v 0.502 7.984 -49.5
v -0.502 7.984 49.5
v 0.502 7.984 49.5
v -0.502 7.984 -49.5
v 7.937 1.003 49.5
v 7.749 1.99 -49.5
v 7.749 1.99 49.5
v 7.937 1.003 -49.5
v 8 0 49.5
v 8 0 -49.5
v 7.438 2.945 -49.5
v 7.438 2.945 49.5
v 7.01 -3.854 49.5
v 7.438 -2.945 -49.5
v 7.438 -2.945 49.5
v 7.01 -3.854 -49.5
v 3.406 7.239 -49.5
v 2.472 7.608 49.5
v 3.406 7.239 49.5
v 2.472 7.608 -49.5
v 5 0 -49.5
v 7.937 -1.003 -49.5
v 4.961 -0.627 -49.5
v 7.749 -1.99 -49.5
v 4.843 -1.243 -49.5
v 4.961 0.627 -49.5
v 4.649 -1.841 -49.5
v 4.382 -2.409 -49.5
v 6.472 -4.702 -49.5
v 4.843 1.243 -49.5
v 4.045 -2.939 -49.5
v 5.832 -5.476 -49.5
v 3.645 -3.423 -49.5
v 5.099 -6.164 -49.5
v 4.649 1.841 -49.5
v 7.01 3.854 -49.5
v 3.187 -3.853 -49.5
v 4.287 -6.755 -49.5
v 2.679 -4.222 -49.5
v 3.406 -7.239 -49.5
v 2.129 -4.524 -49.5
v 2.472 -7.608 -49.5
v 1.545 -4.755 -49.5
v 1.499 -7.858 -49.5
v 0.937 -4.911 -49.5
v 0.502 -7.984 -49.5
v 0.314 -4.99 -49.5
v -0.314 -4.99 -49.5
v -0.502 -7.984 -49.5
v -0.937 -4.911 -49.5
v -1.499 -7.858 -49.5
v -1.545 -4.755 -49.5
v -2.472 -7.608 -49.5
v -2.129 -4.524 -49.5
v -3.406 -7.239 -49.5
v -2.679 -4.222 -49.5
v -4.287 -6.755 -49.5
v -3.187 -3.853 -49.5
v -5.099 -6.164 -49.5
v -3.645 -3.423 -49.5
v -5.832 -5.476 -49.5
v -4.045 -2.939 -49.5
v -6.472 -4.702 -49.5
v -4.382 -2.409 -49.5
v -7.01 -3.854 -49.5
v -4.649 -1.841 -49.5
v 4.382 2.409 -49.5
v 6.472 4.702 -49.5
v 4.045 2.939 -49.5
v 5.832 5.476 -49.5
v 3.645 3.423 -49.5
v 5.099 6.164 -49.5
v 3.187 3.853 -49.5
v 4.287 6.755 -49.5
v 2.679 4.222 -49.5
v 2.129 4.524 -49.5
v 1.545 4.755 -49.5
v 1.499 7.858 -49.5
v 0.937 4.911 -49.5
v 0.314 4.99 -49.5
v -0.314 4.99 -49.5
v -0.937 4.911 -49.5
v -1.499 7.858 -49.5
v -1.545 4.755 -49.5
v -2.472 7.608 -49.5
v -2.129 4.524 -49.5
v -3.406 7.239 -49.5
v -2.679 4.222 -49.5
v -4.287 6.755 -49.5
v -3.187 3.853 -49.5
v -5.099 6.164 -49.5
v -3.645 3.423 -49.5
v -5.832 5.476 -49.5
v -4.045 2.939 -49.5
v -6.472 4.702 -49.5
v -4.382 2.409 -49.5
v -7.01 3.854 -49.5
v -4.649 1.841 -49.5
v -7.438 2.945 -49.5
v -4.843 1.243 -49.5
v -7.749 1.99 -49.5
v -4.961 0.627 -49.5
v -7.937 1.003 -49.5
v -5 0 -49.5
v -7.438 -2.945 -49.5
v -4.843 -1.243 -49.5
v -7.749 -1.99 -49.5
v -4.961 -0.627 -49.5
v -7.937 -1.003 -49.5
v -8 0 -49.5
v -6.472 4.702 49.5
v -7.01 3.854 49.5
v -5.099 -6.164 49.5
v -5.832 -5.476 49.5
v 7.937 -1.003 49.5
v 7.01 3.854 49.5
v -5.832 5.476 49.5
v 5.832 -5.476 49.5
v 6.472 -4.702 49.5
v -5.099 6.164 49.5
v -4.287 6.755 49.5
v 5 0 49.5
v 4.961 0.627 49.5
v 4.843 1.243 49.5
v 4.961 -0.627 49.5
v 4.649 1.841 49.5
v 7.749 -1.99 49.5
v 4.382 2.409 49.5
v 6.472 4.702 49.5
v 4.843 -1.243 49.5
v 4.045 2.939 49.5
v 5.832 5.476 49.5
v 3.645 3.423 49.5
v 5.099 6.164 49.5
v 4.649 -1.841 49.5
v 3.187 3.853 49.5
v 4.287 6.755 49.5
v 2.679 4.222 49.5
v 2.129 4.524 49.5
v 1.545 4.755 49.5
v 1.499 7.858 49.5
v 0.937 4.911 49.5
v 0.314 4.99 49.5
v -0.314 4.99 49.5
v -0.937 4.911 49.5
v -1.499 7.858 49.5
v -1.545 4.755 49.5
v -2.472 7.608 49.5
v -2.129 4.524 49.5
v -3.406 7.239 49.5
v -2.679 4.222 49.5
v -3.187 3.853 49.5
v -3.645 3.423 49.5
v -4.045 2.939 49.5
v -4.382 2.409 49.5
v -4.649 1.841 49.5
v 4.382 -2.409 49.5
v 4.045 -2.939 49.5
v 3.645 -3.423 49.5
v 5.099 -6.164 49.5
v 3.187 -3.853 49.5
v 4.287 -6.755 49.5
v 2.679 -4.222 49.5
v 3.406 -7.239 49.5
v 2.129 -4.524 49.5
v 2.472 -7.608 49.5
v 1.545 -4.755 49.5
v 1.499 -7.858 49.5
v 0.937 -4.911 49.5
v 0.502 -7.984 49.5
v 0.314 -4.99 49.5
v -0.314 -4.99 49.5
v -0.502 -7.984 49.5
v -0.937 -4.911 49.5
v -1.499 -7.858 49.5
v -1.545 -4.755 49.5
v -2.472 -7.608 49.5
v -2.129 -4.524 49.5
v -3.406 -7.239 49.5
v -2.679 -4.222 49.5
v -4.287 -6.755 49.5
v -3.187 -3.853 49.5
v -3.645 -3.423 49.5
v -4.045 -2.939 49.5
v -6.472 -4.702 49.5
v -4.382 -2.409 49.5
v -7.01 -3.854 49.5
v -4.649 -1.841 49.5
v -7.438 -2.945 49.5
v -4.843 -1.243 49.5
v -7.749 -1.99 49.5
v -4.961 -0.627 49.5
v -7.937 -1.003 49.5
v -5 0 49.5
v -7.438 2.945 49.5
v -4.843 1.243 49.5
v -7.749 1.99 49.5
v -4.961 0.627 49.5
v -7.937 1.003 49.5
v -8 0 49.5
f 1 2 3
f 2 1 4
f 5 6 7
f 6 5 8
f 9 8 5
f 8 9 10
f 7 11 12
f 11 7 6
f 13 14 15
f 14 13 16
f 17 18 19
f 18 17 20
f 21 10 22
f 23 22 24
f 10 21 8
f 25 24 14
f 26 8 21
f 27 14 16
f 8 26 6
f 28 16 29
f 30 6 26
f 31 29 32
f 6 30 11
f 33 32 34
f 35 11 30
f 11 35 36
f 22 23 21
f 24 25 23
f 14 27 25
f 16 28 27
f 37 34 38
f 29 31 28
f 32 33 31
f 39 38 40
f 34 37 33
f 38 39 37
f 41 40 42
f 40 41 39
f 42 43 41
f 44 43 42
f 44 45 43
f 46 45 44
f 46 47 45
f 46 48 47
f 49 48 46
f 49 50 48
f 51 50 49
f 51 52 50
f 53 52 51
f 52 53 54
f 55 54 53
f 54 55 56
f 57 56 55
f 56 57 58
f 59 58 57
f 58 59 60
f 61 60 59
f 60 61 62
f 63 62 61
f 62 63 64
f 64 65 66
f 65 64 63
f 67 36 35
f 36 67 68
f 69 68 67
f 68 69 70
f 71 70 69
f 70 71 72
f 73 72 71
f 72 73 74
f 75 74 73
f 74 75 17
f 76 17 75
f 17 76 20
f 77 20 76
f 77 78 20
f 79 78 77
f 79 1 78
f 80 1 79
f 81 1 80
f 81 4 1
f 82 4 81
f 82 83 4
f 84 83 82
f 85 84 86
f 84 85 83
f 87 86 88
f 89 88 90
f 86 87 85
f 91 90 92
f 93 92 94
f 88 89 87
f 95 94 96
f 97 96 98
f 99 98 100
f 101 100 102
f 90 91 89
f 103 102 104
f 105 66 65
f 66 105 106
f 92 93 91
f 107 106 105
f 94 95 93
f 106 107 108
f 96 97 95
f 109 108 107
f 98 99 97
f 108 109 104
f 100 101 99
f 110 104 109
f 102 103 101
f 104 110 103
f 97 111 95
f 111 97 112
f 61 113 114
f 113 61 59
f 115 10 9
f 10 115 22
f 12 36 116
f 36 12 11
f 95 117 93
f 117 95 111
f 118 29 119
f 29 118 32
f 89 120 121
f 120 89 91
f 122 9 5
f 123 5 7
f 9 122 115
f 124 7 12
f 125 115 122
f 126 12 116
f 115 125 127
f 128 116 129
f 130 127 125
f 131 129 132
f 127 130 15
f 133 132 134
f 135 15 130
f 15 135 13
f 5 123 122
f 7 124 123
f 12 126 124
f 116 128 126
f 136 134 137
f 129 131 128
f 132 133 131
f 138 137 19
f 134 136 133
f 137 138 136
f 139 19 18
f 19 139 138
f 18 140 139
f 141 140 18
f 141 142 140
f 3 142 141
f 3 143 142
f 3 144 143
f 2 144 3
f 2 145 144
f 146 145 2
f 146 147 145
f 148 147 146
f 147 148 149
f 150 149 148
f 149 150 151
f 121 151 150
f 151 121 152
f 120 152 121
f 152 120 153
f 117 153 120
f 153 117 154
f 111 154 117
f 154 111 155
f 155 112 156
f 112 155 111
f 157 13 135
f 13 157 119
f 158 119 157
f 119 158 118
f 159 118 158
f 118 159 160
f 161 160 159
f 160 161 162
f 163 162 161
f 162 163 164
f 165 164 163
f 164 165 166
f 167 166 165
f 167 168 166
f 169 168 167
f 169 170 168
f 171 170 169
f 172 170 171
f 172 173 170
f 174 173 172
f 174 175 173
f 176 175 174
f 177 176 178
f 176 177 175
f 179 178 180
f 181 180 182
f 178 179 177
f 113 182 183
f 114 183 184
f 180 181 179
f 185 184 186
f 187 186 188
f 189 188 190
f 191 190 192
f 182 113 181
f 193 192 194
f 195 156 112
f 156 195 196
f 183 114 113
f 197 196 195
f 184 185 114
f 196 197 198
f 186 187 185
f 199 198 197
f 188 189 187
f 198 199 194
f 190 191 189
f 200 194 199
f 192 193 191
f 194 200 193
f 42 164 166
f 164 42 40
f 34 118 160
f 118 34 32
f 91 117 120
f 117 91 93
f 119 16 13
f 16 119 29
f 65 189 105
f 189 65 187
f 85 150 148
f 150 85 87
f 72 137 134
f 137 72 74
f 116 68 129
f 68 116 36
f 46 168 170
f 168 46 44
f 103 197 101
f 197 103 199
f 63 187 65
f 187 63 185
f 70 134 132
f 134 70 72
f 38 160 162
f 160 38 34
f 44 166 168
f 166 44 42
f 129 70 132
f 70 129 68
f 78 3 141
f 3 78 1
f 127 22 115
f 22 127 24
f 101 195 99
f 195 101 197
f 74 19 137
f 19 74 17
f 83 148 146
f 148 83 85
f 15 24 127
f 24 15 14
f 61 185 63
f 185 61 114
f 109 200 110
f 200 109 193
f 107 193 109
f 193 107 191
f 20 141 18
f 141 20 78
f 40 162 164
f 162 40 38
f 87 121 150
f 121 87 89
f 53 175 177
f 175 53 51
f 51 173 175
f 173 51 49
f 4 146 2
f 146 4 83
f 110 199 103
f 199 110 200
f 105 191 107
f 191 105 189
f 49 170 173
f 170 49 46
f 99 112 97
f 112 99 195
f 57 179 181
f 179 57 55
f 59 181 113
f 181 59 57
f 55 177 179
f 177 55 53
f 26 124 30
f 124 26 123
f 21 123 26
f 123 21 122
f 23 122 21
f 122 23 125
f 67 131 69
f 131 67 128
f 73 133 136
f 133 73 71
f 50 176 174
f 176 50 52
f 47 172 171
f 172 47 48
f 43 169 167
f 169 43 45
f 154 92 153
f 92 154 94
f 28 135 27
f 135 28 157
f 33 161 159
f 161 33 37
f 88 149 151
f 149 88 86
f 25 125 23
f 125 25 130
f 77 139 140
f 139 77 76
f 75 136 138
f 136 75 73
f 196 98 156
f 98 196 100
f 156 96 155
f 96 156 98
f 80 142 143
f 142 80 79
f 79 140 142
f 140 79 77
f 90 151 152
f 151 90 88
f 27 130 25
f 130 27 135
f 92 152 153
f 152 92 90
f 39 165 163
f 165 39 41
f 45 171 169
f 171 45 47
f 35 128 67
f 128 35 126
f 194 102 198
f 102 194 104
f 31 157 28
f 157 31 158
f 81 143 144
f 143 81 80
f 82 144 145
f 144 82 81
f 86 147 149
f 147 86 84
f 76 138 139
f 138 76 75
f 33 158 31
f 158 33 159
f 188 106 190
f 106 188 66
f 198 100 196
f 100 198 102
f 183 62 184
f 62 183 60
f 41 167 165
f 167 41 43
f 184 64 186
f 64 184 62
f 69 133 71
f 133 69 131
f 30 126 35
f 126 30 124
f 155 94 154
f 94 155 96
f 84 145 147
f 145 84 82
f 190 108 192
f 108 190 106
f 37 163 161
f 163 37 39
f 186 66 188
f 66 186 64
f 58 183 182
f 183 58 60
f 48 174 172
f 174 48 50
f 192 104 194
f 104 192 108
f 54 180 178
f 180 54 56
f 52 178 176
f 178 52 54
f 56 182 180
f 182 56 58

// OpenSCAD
$fn = 50;


difference() {
	union() {
		translate(v = [0, 0, -49.5000000000]) {
			cylinder(h = 99, r = 8.0000000000);
		}
	}
	union() {
		translate(v = [0, 0, -100.0000000000]) {
			cylinder(h = 200, r = 5.0000000000);
		}
	}
}
